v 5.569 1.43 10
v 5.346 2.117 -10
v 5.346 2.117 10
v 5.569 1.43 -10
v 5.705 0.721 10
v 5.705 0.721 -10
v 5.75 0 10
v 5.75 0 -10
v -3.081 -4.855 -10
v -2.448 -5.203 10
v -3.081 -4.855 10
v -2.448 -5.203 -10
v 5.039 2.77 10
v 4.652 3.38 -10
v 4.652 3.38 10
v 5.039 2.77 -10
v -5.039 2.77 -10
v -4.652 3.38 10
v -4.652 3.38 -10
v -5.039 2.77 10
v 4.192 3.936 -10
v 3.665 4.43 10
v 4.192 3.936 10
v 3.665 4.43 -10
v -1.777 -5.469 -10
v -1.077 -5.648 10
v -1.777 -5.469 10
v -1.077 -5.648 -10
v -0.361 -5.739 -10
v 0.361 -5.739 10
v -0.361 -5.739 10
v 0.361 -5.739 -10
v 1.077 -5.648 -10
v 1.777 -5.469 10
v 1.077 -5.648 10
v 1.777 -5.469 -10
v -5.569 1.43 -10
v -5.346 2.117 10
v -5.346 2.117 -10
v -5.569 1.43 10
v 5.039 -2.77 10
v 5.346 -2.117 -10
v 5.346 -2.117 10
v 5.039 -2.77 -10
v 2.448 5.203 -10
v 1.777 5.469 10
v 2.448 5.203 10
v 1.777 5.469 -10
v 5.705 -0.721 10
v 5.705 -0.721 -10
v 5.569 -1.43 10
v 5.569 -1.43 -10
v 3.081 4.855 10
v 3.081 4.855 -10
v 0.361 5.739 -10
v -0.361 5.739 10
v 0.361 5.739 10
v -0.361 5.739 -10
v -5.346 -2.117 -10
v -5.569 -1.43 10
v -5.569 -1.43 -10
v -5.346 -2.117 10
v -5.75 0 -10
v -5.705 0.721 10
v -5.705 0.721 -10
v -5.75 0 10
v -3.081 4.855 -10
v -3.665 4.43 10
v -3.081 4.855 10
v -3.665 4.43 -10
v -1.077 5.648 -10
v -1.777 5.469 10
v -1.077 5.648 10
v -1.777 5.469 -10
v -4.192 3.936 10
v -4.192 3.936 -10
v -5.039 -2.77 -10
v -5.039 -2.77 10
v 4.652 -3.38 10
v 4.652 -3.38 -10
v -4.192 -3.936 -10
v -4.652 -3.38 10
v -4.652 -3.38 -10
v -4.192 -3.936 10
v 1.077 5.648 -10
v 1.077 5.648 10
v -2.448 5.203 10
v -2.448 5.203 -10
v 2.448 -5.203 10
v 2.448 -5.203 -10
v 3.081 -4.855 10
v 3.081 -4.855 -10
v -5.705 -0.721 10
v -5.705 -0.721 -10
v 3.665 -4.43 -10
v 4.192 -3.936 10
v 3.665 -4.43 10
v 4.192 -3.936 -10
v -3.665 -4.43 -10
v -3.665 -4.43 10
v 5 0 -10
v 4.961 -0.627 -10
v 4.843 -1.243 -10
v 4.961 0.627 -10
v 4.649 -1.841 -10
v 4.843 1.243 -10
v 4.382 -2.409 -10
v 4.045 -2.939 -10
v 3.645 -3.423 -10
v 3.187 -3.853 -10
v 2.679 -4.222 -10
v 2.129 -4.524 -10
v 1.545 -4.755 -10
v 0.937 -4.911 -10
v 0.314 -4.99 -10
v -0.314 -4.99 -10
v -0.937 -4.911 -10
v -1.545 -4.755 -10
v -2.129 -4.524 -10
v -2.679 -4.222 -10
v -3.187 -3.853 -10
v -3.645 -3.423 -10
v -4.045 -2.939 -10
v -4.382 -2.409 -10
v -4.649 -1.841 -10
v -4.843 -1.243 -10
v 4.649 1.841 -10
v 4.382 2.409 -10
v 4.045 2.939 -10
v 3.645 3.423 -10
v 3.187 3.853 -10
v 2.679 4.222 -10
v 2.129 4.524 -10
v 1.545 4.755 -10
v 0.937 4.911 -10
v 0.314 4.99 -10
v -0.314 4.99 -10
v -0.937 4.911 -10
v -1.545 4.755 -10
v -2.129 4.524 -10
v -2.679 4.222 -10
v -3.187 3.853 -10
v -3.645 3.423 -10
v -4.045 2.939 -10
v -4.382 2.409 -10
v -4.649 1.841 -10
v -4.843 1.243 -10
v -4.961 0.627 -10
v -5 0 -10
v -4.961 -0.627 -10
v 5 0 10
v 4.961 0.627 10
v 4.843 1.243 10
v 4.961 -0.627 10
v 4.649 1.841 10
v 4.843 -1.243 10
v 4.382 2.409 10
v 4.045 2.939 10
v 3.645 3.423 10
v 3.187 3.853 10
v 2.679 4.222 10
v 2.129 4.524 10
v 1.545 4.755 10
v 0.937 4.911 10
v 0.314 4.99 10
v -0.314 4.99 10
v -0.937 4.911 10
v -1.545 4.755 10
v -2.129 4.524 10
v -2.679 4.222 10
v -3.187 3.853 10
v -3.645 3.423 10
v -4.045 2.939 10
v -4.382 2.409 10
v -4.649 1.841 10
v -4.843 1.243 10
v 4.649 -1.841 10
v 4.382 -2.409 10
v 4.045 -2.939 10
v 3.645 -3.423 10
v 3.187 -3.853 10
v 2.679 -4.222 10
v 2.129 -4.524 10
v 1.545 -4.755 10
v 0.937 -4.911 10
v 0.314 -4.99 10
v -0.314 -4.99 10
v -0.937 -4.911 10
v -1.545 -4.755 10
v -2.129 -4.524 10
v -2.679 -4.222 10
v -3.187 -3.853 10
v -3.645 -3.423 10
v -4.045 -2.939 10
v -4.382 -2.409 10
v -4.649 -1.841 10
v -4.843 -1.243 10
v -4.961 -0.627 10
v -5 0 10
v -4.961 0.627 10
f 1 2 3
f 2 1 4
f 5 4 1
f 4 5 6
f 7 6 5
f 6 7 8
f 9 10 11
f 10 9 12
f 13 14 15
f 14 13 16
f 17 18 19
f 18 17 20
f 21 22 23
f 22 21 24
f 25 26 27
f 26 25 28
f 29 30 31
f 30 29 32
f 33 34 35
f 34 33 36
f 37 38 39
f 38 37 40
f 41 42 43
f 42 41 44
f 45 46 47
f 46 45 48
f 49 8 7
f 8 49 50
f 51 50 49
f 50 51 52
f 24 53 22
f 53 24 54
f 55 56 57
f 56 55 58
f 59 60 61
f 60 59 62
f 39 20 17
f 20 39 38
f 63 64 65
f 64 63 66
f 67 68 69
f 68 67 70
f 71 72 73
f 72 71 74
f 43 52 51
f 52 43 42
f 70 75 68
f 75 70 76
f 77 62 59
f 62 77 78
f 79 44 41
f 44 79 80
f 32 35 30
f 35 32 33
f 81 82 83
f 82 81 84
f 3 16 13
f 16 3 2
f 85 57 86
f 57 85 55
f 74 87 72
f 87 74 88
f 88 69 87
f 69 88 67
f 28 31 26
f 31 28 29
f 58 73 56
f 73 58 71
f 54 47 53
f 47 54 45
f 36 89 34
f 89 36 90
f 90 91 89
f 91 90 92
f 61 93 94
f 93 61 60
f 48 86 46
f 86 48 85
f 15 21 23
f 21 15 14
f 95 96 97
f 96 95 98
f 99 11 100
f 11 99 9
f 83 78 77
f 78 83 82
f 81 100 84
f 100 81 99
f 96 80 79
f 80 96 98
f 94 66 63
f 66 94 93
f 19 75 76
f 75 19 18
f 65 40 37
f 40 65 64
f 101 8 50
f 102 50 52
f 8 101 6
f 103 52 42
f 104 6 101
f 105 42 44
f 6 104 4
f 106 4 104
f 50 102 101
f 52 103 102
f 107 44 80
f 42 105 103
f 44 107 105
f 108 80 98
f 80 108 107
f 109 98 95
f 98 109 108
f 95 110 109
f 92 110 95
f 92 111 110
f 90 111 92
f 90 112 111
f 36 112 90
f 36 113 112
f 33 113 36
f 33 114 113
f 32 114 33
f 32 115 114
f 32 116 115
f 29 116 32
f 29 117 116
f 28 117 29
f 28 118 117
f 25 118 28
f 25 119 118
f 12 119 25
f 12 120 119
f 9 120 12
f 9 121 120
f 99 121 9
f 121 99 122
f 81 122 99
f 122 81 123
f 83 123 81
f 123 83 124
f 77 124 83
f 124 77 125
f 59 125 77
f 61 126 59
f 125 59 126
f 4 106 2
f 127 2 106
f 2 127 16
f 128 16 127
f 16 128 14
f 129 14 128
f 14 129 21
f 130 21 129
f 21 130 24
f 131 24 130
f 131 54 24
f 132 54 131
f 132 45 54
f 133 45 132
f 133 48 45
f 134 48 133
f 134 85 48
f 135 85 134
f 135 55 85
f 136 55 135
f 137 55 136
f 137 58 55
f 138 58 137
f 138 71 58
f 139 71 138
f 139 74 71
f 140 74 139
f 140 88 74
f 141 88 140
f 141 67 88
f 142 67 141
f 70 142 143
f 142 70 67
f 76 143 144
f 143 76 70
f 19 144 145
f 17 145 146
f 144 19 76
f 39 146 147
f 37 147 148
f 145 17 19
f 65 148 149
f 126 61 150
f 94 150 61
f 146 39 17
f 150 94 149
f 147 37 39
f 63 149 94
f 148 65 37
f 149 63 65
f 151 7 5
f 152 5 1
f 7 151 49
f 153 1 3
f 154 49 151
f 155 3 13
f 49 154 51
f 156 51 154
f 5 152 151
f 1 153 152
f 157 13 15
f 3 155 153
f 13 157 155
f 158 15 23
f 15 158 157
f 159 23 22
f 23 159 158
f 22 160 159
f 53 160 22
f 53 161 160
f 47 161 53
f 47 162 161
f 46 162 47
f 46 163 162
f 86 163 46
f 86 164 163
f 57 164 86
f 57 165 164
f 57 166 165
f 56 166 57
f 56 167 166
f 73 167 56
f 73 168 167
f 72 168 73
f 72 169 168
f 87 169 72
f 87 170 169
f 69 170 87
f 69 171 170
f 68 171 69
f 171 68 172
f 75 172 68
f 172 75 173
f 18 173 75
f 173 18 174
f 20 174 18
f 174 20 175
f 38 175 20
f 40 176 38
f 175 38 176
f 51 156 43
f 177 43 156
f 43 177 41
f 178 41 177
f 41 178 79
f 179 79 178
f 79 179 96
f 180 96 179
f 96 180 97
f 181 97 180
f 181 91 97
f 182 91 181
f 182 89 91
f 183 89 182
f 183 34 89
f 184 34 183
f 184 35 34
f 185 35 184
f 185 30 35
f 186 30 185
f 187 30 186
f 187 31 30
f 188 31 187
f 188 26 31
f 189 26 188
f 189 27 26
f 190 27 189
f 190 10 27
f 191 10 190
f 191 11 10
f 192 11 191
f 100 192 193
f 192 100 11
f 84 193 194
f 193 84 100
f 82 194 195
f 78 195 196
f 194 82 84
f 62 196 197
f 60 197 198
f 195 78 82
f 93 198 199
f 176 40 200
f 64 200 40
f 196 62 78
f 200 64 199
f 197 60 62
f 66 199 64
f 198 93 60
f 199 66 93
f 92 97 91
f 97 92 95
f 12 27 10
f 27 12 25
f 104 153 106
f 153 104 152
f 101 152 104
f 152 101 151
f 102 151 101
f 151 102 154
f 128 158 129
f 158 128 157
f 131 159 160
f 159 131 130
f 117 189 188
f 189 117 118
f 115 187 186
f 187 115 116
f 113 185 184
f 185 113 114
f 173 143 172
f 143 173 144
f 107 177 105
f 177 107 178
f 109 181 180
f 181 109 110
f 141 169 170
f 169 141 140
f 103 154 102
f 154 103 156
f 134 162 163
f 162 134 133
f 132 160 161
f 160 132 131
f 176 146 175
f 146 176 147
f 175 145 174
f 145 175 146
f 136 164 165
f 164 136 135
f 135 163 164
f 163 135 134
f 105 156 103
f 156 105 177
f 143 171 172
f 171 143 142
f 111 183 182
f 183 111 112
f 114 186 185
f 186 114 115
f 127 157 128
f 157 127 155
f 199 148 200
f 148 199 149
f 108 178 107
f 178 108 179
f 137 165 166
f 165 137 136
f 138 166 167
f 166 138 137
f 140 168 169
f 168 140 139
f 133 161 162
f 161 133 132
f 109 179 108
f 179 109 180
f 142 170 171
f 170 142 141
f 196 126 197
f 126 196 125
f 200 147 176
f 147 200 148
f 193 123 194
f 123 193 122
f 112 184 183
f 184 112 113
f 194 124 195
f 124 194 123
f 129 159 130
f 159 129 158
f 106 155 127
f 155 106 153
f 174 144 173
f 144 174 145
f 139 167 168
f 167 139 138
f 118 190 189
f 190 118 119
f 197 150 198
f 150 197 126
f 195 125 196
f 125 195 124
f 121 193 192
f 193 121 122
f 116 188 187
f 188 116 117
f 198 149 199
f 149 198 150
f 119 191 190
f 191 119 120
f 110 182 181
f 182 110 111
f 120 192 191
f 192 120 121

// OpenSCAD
$fn = 50;


difference() {
	union() {
		translate(v = [0, 0, -10.0000000000]) {
			cylinder(h = 20, r = 5.7500000000);
		}
	}
	union() {
		translate(v = [0, 0, -100.0000000000]) {
			cylinder(h = 200, r = 5.0000000000);
		}
	}
}
